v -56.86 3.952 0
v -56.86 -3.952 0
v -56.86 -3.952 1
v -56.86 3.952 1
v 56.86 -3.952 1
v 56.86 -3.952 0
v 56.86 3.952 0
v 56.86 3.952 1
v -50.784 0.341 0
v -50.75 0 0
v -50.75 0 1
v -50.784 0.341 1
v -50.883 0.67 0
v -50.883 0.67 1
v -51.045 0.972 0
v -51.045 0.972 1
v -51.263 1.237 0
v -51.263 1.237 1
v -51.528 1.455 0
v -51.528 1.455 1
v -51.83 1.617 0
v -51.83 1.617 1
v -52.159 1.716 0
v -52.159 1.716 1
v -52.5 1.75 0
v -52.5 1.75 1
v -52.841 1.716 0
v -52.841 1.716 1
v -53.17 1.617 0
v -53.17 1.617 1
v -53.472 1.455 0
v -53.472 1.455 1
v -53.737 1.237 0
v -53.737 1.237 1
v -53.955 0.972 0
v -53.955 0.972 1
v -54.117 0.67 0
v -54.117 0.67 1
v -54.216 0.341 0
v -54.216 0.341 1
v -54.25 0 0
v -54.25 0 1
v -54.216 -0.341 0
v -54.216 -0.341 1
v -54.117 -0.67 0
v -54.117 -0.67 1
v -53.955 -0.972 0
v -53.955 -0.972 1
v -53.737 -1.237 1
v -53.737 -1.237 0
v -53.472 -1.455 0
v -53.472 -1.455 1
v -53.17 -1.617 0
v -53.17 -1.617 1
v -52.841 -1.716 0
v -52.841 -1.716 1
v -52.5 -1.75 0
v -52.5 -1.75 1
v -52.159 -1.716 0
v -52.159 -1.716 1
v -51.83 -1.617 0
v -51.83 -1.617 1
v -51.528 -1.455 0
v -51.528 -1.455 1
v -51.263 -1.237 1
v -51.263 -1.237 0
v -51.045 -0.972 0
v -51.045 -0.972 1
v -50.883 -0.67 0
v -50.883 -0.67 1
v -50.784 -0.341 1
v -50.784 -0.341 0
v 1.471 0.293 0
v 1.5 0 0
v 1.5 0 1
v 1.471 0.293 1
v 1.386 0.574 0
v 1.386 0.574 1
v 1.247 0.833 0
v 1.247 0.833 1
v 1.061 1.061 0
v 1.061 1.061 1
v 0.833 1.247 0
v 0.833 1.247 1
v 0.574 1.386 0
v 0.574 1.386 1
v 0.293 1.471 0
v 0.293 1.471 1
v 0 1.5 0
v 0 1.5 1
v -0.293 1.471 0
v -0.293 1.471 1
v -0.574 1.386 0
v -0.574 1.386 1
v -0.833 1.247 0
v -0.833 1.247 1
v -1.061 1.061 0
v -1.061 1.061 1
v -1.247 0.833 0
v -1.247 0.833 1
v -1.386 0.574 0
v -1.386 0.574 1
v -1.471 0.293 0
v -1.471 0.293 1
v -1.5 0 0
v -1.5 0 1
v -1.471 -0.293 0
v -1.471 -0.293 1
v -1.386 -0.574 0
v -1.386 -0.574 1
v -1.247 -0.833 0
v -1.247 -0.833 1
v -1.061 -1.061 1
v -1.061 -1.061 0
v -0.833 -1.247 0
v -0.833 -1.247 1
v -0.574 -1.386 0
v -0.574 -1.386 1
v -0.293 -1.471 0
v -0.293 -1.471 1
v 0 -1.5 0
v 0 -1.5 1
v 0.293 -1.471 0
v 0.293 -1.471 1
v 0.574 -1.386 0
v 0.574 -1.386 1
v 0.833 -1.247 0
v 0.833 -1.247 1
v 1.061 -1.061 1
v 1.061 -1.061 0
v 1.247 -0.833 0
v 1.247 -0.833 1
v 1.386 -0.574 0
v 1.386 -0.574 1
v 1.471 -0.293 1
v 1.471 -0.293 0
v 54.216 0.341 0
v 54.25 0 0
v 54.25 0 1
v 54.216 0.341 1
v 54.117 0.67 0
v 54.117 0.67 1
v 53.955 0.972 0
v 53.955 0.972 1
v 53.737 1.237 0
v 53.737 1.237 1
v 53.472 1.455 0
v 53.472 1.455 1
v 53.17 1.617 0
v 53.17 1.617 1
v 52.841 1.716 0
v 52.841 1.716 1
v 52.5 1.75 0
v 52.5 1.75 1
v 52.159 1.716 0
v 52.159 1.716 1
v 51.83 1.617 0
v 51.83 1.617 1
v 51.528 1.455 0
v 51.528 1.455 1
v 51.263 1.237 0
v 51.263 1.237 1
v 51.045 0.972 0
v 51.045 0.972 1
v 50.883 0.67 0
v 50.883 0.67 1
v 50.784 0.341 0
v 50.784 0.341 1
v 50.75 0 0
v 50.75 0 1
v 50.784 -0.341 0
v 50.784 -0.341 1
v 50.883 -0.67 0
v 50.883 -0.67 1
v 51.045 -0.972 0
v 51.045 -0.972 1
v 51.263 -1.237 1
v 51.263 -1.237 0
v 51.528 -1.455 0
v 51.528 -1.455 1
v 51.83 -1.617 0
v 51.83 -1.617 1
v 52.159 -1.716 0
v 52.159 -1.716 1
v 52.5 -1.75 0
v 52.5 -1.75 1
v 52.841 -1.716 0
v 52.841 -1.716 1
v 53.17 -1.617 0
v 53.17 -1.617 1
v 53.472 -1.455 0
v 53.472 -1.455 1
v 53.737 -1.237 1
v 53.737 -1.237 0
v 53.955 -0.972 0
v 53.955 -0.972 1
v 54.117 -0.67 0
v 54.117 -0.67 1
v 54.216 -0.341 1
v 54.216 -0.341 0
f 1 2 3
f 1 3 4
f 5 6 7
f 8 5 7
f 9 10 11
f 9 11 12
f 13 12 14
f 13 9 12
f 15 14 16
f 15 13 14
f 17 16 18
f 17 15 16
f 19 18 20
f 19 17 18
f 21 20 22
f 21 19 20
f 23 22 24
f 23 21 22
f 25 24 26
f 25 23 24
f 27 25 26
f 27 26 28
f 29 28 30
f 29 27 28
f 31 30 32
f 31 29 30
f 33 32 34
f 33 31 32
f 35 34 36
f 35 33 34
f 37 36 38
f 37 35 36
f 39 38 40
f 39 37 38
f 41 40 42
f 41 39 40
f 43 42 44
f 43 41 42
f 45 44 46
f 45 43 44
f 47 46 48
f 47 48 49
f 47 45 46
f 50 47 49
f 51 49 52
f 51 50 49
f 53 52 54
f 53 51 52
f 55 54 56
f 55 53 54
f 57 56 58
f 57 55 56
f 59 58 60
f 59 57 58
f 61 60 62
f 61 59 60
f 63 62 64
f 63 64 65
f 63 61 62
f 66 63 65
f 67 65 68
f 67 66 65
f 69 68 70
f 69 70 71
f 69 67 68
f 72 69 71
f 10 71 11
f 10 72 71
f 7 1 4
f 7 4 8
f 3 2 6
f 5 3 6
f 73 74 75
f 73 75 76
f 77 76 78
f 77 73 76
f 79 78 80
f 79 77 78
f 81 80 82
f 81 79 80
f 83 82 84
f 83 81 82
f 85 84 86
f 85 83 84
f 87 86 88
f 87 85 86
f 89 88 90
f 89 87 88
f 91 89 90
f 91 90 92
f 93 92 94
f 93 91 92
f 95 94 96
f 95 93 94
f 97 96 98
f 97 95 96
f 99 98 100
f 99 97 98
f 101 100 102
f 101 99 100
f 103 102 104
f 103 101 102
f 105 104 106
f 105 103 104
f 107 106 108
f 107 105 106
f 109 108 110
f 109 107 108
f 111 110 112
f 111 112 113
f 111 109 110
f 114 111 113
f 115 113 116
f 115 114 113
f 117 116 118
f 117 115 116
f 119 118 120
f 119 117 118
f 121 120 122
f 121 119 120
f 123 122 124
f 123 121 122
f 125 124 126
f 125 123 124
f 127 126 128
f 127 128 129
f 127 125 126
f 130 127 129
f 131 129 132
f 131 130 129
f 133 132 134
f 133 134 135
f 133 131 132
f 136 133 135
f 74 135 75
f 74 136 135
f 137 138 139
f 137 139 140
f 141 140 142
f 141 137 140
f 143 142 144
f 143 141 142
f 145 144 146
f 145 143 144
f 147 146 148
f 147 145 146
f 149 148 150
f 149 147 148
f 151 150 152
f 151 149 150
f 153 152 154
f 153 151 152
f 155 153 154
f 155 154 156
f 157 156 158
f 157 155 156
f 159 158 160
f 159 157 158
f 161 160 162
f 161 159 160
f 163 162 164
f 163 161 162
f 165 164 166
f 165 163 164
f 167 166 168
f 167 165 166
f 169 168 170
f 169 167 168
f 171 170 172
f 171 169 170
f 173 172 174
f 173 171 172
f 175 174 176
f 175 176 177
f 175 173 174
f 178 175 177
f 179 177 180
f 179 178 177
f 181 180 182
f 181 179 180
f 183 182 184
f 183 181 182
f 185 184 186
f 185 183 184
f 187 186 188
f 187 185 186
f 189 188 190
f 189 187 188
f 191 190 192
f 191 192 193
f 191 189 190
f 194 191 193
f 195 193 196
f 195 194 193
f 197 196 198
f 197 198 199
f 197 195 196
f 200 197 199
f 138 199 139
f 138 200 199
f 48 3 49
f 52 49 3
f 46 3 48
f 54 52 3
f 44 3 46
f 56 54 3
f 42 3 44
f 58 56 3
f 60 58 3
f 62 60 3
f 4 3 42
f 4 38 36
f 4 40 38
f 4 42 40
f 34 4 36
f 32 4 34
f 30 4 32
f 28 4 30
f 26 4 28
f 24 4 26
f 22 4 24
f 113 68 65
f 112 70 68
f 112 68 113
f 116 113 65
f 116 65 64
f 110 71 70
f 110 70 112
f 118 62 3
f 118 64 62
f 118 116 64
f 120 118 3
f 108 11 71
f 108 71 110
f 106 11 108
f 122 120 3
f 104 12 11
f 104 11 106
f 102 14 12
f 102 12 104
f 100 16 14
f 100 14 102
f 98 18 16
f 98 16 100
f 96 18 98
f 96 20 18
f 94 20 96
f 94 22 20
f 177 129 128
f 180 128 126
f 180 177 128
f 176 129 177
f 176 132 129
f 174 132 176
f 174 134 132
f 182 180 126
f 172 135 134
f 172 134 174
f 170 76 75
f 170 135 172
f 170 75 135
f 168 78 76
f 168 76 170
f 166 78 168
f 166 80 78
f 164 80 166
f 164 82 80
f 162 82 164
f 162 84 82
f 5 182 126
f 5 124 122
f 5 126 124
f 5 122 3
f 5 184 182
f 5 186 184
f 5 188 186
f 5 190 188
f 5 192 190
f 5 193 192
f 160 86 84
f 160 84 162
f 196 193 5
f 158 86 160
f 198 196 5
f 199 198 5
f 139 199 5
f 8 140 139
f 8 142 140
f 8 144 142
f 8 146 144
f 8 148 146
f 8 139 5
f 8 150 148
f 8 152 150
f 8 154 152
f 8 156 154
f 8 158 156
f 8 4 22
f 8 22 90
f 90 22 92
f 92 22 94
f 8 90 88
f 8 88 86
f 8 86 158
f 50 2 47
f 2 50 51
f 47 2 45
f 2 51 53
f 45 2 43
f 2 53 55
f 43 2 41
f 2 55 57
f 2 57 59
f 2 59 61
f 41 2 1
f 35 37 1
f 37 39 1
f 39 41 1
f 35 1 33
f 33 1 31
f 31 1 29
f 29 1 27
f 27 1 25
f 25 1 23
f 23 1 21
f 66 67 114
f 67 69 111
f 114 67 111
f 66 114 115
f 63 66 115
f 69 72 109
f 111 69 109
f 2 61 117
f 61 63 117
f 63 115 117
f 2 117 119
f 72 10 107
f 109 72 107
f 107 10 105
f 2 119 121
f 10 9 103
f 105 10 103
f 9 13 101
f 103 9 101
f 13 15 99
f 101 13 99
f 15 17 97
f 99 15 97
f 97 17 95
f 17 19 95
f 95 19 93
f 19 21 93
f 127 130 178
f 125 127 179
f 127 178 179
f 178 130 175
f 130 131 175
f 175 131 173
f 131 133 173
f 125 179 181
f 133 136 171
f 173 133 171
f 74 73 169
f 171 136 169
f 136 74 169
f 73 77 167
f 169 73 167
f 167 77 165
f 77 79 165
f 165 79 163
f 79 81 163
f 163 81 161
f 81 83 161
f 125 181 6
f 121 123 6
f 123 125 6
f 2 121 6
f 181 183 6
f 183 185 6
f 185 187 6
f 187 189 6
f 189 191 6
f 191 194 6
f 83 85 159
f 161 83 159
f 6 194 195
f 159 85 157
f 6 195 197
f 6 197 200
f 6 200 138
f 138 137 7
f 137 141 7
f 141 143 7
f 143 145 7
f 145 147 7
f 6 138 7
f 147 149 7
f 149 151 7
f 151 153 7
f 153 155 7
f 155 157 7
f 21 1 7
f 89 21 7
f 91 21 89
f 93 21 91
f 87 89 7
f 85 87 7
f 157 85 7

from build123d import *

# Parameters (mm, degrees)
SKETCH004_W   = 113.720292
SKETCH004_H   = 7.903844
SKETCH004_R   = 1.75
SKETCH004_R_2 = 1.5
PAD_DEPTH     = 1


with BuildPart() as part:
    # Sketch004 → Pad (new body)
    with BuildSketch(Plane.XY):
        Rectangle(SKETCH004_W, SKETCH004_H)
        with Locations((-52.5, 0)):
            Circle(SKETCH004_R, mode=Mode.SUBTRACT)
        with Locations((52.5, 0)):
            Circle(SKETCH004_R, mode=Mode.SUBTRACT)
        Circle(SKETCH004_R_2, mode=Mode.SUBTRACT)
    extrude(amount=PAD_DEPTH)


solid = part.part
